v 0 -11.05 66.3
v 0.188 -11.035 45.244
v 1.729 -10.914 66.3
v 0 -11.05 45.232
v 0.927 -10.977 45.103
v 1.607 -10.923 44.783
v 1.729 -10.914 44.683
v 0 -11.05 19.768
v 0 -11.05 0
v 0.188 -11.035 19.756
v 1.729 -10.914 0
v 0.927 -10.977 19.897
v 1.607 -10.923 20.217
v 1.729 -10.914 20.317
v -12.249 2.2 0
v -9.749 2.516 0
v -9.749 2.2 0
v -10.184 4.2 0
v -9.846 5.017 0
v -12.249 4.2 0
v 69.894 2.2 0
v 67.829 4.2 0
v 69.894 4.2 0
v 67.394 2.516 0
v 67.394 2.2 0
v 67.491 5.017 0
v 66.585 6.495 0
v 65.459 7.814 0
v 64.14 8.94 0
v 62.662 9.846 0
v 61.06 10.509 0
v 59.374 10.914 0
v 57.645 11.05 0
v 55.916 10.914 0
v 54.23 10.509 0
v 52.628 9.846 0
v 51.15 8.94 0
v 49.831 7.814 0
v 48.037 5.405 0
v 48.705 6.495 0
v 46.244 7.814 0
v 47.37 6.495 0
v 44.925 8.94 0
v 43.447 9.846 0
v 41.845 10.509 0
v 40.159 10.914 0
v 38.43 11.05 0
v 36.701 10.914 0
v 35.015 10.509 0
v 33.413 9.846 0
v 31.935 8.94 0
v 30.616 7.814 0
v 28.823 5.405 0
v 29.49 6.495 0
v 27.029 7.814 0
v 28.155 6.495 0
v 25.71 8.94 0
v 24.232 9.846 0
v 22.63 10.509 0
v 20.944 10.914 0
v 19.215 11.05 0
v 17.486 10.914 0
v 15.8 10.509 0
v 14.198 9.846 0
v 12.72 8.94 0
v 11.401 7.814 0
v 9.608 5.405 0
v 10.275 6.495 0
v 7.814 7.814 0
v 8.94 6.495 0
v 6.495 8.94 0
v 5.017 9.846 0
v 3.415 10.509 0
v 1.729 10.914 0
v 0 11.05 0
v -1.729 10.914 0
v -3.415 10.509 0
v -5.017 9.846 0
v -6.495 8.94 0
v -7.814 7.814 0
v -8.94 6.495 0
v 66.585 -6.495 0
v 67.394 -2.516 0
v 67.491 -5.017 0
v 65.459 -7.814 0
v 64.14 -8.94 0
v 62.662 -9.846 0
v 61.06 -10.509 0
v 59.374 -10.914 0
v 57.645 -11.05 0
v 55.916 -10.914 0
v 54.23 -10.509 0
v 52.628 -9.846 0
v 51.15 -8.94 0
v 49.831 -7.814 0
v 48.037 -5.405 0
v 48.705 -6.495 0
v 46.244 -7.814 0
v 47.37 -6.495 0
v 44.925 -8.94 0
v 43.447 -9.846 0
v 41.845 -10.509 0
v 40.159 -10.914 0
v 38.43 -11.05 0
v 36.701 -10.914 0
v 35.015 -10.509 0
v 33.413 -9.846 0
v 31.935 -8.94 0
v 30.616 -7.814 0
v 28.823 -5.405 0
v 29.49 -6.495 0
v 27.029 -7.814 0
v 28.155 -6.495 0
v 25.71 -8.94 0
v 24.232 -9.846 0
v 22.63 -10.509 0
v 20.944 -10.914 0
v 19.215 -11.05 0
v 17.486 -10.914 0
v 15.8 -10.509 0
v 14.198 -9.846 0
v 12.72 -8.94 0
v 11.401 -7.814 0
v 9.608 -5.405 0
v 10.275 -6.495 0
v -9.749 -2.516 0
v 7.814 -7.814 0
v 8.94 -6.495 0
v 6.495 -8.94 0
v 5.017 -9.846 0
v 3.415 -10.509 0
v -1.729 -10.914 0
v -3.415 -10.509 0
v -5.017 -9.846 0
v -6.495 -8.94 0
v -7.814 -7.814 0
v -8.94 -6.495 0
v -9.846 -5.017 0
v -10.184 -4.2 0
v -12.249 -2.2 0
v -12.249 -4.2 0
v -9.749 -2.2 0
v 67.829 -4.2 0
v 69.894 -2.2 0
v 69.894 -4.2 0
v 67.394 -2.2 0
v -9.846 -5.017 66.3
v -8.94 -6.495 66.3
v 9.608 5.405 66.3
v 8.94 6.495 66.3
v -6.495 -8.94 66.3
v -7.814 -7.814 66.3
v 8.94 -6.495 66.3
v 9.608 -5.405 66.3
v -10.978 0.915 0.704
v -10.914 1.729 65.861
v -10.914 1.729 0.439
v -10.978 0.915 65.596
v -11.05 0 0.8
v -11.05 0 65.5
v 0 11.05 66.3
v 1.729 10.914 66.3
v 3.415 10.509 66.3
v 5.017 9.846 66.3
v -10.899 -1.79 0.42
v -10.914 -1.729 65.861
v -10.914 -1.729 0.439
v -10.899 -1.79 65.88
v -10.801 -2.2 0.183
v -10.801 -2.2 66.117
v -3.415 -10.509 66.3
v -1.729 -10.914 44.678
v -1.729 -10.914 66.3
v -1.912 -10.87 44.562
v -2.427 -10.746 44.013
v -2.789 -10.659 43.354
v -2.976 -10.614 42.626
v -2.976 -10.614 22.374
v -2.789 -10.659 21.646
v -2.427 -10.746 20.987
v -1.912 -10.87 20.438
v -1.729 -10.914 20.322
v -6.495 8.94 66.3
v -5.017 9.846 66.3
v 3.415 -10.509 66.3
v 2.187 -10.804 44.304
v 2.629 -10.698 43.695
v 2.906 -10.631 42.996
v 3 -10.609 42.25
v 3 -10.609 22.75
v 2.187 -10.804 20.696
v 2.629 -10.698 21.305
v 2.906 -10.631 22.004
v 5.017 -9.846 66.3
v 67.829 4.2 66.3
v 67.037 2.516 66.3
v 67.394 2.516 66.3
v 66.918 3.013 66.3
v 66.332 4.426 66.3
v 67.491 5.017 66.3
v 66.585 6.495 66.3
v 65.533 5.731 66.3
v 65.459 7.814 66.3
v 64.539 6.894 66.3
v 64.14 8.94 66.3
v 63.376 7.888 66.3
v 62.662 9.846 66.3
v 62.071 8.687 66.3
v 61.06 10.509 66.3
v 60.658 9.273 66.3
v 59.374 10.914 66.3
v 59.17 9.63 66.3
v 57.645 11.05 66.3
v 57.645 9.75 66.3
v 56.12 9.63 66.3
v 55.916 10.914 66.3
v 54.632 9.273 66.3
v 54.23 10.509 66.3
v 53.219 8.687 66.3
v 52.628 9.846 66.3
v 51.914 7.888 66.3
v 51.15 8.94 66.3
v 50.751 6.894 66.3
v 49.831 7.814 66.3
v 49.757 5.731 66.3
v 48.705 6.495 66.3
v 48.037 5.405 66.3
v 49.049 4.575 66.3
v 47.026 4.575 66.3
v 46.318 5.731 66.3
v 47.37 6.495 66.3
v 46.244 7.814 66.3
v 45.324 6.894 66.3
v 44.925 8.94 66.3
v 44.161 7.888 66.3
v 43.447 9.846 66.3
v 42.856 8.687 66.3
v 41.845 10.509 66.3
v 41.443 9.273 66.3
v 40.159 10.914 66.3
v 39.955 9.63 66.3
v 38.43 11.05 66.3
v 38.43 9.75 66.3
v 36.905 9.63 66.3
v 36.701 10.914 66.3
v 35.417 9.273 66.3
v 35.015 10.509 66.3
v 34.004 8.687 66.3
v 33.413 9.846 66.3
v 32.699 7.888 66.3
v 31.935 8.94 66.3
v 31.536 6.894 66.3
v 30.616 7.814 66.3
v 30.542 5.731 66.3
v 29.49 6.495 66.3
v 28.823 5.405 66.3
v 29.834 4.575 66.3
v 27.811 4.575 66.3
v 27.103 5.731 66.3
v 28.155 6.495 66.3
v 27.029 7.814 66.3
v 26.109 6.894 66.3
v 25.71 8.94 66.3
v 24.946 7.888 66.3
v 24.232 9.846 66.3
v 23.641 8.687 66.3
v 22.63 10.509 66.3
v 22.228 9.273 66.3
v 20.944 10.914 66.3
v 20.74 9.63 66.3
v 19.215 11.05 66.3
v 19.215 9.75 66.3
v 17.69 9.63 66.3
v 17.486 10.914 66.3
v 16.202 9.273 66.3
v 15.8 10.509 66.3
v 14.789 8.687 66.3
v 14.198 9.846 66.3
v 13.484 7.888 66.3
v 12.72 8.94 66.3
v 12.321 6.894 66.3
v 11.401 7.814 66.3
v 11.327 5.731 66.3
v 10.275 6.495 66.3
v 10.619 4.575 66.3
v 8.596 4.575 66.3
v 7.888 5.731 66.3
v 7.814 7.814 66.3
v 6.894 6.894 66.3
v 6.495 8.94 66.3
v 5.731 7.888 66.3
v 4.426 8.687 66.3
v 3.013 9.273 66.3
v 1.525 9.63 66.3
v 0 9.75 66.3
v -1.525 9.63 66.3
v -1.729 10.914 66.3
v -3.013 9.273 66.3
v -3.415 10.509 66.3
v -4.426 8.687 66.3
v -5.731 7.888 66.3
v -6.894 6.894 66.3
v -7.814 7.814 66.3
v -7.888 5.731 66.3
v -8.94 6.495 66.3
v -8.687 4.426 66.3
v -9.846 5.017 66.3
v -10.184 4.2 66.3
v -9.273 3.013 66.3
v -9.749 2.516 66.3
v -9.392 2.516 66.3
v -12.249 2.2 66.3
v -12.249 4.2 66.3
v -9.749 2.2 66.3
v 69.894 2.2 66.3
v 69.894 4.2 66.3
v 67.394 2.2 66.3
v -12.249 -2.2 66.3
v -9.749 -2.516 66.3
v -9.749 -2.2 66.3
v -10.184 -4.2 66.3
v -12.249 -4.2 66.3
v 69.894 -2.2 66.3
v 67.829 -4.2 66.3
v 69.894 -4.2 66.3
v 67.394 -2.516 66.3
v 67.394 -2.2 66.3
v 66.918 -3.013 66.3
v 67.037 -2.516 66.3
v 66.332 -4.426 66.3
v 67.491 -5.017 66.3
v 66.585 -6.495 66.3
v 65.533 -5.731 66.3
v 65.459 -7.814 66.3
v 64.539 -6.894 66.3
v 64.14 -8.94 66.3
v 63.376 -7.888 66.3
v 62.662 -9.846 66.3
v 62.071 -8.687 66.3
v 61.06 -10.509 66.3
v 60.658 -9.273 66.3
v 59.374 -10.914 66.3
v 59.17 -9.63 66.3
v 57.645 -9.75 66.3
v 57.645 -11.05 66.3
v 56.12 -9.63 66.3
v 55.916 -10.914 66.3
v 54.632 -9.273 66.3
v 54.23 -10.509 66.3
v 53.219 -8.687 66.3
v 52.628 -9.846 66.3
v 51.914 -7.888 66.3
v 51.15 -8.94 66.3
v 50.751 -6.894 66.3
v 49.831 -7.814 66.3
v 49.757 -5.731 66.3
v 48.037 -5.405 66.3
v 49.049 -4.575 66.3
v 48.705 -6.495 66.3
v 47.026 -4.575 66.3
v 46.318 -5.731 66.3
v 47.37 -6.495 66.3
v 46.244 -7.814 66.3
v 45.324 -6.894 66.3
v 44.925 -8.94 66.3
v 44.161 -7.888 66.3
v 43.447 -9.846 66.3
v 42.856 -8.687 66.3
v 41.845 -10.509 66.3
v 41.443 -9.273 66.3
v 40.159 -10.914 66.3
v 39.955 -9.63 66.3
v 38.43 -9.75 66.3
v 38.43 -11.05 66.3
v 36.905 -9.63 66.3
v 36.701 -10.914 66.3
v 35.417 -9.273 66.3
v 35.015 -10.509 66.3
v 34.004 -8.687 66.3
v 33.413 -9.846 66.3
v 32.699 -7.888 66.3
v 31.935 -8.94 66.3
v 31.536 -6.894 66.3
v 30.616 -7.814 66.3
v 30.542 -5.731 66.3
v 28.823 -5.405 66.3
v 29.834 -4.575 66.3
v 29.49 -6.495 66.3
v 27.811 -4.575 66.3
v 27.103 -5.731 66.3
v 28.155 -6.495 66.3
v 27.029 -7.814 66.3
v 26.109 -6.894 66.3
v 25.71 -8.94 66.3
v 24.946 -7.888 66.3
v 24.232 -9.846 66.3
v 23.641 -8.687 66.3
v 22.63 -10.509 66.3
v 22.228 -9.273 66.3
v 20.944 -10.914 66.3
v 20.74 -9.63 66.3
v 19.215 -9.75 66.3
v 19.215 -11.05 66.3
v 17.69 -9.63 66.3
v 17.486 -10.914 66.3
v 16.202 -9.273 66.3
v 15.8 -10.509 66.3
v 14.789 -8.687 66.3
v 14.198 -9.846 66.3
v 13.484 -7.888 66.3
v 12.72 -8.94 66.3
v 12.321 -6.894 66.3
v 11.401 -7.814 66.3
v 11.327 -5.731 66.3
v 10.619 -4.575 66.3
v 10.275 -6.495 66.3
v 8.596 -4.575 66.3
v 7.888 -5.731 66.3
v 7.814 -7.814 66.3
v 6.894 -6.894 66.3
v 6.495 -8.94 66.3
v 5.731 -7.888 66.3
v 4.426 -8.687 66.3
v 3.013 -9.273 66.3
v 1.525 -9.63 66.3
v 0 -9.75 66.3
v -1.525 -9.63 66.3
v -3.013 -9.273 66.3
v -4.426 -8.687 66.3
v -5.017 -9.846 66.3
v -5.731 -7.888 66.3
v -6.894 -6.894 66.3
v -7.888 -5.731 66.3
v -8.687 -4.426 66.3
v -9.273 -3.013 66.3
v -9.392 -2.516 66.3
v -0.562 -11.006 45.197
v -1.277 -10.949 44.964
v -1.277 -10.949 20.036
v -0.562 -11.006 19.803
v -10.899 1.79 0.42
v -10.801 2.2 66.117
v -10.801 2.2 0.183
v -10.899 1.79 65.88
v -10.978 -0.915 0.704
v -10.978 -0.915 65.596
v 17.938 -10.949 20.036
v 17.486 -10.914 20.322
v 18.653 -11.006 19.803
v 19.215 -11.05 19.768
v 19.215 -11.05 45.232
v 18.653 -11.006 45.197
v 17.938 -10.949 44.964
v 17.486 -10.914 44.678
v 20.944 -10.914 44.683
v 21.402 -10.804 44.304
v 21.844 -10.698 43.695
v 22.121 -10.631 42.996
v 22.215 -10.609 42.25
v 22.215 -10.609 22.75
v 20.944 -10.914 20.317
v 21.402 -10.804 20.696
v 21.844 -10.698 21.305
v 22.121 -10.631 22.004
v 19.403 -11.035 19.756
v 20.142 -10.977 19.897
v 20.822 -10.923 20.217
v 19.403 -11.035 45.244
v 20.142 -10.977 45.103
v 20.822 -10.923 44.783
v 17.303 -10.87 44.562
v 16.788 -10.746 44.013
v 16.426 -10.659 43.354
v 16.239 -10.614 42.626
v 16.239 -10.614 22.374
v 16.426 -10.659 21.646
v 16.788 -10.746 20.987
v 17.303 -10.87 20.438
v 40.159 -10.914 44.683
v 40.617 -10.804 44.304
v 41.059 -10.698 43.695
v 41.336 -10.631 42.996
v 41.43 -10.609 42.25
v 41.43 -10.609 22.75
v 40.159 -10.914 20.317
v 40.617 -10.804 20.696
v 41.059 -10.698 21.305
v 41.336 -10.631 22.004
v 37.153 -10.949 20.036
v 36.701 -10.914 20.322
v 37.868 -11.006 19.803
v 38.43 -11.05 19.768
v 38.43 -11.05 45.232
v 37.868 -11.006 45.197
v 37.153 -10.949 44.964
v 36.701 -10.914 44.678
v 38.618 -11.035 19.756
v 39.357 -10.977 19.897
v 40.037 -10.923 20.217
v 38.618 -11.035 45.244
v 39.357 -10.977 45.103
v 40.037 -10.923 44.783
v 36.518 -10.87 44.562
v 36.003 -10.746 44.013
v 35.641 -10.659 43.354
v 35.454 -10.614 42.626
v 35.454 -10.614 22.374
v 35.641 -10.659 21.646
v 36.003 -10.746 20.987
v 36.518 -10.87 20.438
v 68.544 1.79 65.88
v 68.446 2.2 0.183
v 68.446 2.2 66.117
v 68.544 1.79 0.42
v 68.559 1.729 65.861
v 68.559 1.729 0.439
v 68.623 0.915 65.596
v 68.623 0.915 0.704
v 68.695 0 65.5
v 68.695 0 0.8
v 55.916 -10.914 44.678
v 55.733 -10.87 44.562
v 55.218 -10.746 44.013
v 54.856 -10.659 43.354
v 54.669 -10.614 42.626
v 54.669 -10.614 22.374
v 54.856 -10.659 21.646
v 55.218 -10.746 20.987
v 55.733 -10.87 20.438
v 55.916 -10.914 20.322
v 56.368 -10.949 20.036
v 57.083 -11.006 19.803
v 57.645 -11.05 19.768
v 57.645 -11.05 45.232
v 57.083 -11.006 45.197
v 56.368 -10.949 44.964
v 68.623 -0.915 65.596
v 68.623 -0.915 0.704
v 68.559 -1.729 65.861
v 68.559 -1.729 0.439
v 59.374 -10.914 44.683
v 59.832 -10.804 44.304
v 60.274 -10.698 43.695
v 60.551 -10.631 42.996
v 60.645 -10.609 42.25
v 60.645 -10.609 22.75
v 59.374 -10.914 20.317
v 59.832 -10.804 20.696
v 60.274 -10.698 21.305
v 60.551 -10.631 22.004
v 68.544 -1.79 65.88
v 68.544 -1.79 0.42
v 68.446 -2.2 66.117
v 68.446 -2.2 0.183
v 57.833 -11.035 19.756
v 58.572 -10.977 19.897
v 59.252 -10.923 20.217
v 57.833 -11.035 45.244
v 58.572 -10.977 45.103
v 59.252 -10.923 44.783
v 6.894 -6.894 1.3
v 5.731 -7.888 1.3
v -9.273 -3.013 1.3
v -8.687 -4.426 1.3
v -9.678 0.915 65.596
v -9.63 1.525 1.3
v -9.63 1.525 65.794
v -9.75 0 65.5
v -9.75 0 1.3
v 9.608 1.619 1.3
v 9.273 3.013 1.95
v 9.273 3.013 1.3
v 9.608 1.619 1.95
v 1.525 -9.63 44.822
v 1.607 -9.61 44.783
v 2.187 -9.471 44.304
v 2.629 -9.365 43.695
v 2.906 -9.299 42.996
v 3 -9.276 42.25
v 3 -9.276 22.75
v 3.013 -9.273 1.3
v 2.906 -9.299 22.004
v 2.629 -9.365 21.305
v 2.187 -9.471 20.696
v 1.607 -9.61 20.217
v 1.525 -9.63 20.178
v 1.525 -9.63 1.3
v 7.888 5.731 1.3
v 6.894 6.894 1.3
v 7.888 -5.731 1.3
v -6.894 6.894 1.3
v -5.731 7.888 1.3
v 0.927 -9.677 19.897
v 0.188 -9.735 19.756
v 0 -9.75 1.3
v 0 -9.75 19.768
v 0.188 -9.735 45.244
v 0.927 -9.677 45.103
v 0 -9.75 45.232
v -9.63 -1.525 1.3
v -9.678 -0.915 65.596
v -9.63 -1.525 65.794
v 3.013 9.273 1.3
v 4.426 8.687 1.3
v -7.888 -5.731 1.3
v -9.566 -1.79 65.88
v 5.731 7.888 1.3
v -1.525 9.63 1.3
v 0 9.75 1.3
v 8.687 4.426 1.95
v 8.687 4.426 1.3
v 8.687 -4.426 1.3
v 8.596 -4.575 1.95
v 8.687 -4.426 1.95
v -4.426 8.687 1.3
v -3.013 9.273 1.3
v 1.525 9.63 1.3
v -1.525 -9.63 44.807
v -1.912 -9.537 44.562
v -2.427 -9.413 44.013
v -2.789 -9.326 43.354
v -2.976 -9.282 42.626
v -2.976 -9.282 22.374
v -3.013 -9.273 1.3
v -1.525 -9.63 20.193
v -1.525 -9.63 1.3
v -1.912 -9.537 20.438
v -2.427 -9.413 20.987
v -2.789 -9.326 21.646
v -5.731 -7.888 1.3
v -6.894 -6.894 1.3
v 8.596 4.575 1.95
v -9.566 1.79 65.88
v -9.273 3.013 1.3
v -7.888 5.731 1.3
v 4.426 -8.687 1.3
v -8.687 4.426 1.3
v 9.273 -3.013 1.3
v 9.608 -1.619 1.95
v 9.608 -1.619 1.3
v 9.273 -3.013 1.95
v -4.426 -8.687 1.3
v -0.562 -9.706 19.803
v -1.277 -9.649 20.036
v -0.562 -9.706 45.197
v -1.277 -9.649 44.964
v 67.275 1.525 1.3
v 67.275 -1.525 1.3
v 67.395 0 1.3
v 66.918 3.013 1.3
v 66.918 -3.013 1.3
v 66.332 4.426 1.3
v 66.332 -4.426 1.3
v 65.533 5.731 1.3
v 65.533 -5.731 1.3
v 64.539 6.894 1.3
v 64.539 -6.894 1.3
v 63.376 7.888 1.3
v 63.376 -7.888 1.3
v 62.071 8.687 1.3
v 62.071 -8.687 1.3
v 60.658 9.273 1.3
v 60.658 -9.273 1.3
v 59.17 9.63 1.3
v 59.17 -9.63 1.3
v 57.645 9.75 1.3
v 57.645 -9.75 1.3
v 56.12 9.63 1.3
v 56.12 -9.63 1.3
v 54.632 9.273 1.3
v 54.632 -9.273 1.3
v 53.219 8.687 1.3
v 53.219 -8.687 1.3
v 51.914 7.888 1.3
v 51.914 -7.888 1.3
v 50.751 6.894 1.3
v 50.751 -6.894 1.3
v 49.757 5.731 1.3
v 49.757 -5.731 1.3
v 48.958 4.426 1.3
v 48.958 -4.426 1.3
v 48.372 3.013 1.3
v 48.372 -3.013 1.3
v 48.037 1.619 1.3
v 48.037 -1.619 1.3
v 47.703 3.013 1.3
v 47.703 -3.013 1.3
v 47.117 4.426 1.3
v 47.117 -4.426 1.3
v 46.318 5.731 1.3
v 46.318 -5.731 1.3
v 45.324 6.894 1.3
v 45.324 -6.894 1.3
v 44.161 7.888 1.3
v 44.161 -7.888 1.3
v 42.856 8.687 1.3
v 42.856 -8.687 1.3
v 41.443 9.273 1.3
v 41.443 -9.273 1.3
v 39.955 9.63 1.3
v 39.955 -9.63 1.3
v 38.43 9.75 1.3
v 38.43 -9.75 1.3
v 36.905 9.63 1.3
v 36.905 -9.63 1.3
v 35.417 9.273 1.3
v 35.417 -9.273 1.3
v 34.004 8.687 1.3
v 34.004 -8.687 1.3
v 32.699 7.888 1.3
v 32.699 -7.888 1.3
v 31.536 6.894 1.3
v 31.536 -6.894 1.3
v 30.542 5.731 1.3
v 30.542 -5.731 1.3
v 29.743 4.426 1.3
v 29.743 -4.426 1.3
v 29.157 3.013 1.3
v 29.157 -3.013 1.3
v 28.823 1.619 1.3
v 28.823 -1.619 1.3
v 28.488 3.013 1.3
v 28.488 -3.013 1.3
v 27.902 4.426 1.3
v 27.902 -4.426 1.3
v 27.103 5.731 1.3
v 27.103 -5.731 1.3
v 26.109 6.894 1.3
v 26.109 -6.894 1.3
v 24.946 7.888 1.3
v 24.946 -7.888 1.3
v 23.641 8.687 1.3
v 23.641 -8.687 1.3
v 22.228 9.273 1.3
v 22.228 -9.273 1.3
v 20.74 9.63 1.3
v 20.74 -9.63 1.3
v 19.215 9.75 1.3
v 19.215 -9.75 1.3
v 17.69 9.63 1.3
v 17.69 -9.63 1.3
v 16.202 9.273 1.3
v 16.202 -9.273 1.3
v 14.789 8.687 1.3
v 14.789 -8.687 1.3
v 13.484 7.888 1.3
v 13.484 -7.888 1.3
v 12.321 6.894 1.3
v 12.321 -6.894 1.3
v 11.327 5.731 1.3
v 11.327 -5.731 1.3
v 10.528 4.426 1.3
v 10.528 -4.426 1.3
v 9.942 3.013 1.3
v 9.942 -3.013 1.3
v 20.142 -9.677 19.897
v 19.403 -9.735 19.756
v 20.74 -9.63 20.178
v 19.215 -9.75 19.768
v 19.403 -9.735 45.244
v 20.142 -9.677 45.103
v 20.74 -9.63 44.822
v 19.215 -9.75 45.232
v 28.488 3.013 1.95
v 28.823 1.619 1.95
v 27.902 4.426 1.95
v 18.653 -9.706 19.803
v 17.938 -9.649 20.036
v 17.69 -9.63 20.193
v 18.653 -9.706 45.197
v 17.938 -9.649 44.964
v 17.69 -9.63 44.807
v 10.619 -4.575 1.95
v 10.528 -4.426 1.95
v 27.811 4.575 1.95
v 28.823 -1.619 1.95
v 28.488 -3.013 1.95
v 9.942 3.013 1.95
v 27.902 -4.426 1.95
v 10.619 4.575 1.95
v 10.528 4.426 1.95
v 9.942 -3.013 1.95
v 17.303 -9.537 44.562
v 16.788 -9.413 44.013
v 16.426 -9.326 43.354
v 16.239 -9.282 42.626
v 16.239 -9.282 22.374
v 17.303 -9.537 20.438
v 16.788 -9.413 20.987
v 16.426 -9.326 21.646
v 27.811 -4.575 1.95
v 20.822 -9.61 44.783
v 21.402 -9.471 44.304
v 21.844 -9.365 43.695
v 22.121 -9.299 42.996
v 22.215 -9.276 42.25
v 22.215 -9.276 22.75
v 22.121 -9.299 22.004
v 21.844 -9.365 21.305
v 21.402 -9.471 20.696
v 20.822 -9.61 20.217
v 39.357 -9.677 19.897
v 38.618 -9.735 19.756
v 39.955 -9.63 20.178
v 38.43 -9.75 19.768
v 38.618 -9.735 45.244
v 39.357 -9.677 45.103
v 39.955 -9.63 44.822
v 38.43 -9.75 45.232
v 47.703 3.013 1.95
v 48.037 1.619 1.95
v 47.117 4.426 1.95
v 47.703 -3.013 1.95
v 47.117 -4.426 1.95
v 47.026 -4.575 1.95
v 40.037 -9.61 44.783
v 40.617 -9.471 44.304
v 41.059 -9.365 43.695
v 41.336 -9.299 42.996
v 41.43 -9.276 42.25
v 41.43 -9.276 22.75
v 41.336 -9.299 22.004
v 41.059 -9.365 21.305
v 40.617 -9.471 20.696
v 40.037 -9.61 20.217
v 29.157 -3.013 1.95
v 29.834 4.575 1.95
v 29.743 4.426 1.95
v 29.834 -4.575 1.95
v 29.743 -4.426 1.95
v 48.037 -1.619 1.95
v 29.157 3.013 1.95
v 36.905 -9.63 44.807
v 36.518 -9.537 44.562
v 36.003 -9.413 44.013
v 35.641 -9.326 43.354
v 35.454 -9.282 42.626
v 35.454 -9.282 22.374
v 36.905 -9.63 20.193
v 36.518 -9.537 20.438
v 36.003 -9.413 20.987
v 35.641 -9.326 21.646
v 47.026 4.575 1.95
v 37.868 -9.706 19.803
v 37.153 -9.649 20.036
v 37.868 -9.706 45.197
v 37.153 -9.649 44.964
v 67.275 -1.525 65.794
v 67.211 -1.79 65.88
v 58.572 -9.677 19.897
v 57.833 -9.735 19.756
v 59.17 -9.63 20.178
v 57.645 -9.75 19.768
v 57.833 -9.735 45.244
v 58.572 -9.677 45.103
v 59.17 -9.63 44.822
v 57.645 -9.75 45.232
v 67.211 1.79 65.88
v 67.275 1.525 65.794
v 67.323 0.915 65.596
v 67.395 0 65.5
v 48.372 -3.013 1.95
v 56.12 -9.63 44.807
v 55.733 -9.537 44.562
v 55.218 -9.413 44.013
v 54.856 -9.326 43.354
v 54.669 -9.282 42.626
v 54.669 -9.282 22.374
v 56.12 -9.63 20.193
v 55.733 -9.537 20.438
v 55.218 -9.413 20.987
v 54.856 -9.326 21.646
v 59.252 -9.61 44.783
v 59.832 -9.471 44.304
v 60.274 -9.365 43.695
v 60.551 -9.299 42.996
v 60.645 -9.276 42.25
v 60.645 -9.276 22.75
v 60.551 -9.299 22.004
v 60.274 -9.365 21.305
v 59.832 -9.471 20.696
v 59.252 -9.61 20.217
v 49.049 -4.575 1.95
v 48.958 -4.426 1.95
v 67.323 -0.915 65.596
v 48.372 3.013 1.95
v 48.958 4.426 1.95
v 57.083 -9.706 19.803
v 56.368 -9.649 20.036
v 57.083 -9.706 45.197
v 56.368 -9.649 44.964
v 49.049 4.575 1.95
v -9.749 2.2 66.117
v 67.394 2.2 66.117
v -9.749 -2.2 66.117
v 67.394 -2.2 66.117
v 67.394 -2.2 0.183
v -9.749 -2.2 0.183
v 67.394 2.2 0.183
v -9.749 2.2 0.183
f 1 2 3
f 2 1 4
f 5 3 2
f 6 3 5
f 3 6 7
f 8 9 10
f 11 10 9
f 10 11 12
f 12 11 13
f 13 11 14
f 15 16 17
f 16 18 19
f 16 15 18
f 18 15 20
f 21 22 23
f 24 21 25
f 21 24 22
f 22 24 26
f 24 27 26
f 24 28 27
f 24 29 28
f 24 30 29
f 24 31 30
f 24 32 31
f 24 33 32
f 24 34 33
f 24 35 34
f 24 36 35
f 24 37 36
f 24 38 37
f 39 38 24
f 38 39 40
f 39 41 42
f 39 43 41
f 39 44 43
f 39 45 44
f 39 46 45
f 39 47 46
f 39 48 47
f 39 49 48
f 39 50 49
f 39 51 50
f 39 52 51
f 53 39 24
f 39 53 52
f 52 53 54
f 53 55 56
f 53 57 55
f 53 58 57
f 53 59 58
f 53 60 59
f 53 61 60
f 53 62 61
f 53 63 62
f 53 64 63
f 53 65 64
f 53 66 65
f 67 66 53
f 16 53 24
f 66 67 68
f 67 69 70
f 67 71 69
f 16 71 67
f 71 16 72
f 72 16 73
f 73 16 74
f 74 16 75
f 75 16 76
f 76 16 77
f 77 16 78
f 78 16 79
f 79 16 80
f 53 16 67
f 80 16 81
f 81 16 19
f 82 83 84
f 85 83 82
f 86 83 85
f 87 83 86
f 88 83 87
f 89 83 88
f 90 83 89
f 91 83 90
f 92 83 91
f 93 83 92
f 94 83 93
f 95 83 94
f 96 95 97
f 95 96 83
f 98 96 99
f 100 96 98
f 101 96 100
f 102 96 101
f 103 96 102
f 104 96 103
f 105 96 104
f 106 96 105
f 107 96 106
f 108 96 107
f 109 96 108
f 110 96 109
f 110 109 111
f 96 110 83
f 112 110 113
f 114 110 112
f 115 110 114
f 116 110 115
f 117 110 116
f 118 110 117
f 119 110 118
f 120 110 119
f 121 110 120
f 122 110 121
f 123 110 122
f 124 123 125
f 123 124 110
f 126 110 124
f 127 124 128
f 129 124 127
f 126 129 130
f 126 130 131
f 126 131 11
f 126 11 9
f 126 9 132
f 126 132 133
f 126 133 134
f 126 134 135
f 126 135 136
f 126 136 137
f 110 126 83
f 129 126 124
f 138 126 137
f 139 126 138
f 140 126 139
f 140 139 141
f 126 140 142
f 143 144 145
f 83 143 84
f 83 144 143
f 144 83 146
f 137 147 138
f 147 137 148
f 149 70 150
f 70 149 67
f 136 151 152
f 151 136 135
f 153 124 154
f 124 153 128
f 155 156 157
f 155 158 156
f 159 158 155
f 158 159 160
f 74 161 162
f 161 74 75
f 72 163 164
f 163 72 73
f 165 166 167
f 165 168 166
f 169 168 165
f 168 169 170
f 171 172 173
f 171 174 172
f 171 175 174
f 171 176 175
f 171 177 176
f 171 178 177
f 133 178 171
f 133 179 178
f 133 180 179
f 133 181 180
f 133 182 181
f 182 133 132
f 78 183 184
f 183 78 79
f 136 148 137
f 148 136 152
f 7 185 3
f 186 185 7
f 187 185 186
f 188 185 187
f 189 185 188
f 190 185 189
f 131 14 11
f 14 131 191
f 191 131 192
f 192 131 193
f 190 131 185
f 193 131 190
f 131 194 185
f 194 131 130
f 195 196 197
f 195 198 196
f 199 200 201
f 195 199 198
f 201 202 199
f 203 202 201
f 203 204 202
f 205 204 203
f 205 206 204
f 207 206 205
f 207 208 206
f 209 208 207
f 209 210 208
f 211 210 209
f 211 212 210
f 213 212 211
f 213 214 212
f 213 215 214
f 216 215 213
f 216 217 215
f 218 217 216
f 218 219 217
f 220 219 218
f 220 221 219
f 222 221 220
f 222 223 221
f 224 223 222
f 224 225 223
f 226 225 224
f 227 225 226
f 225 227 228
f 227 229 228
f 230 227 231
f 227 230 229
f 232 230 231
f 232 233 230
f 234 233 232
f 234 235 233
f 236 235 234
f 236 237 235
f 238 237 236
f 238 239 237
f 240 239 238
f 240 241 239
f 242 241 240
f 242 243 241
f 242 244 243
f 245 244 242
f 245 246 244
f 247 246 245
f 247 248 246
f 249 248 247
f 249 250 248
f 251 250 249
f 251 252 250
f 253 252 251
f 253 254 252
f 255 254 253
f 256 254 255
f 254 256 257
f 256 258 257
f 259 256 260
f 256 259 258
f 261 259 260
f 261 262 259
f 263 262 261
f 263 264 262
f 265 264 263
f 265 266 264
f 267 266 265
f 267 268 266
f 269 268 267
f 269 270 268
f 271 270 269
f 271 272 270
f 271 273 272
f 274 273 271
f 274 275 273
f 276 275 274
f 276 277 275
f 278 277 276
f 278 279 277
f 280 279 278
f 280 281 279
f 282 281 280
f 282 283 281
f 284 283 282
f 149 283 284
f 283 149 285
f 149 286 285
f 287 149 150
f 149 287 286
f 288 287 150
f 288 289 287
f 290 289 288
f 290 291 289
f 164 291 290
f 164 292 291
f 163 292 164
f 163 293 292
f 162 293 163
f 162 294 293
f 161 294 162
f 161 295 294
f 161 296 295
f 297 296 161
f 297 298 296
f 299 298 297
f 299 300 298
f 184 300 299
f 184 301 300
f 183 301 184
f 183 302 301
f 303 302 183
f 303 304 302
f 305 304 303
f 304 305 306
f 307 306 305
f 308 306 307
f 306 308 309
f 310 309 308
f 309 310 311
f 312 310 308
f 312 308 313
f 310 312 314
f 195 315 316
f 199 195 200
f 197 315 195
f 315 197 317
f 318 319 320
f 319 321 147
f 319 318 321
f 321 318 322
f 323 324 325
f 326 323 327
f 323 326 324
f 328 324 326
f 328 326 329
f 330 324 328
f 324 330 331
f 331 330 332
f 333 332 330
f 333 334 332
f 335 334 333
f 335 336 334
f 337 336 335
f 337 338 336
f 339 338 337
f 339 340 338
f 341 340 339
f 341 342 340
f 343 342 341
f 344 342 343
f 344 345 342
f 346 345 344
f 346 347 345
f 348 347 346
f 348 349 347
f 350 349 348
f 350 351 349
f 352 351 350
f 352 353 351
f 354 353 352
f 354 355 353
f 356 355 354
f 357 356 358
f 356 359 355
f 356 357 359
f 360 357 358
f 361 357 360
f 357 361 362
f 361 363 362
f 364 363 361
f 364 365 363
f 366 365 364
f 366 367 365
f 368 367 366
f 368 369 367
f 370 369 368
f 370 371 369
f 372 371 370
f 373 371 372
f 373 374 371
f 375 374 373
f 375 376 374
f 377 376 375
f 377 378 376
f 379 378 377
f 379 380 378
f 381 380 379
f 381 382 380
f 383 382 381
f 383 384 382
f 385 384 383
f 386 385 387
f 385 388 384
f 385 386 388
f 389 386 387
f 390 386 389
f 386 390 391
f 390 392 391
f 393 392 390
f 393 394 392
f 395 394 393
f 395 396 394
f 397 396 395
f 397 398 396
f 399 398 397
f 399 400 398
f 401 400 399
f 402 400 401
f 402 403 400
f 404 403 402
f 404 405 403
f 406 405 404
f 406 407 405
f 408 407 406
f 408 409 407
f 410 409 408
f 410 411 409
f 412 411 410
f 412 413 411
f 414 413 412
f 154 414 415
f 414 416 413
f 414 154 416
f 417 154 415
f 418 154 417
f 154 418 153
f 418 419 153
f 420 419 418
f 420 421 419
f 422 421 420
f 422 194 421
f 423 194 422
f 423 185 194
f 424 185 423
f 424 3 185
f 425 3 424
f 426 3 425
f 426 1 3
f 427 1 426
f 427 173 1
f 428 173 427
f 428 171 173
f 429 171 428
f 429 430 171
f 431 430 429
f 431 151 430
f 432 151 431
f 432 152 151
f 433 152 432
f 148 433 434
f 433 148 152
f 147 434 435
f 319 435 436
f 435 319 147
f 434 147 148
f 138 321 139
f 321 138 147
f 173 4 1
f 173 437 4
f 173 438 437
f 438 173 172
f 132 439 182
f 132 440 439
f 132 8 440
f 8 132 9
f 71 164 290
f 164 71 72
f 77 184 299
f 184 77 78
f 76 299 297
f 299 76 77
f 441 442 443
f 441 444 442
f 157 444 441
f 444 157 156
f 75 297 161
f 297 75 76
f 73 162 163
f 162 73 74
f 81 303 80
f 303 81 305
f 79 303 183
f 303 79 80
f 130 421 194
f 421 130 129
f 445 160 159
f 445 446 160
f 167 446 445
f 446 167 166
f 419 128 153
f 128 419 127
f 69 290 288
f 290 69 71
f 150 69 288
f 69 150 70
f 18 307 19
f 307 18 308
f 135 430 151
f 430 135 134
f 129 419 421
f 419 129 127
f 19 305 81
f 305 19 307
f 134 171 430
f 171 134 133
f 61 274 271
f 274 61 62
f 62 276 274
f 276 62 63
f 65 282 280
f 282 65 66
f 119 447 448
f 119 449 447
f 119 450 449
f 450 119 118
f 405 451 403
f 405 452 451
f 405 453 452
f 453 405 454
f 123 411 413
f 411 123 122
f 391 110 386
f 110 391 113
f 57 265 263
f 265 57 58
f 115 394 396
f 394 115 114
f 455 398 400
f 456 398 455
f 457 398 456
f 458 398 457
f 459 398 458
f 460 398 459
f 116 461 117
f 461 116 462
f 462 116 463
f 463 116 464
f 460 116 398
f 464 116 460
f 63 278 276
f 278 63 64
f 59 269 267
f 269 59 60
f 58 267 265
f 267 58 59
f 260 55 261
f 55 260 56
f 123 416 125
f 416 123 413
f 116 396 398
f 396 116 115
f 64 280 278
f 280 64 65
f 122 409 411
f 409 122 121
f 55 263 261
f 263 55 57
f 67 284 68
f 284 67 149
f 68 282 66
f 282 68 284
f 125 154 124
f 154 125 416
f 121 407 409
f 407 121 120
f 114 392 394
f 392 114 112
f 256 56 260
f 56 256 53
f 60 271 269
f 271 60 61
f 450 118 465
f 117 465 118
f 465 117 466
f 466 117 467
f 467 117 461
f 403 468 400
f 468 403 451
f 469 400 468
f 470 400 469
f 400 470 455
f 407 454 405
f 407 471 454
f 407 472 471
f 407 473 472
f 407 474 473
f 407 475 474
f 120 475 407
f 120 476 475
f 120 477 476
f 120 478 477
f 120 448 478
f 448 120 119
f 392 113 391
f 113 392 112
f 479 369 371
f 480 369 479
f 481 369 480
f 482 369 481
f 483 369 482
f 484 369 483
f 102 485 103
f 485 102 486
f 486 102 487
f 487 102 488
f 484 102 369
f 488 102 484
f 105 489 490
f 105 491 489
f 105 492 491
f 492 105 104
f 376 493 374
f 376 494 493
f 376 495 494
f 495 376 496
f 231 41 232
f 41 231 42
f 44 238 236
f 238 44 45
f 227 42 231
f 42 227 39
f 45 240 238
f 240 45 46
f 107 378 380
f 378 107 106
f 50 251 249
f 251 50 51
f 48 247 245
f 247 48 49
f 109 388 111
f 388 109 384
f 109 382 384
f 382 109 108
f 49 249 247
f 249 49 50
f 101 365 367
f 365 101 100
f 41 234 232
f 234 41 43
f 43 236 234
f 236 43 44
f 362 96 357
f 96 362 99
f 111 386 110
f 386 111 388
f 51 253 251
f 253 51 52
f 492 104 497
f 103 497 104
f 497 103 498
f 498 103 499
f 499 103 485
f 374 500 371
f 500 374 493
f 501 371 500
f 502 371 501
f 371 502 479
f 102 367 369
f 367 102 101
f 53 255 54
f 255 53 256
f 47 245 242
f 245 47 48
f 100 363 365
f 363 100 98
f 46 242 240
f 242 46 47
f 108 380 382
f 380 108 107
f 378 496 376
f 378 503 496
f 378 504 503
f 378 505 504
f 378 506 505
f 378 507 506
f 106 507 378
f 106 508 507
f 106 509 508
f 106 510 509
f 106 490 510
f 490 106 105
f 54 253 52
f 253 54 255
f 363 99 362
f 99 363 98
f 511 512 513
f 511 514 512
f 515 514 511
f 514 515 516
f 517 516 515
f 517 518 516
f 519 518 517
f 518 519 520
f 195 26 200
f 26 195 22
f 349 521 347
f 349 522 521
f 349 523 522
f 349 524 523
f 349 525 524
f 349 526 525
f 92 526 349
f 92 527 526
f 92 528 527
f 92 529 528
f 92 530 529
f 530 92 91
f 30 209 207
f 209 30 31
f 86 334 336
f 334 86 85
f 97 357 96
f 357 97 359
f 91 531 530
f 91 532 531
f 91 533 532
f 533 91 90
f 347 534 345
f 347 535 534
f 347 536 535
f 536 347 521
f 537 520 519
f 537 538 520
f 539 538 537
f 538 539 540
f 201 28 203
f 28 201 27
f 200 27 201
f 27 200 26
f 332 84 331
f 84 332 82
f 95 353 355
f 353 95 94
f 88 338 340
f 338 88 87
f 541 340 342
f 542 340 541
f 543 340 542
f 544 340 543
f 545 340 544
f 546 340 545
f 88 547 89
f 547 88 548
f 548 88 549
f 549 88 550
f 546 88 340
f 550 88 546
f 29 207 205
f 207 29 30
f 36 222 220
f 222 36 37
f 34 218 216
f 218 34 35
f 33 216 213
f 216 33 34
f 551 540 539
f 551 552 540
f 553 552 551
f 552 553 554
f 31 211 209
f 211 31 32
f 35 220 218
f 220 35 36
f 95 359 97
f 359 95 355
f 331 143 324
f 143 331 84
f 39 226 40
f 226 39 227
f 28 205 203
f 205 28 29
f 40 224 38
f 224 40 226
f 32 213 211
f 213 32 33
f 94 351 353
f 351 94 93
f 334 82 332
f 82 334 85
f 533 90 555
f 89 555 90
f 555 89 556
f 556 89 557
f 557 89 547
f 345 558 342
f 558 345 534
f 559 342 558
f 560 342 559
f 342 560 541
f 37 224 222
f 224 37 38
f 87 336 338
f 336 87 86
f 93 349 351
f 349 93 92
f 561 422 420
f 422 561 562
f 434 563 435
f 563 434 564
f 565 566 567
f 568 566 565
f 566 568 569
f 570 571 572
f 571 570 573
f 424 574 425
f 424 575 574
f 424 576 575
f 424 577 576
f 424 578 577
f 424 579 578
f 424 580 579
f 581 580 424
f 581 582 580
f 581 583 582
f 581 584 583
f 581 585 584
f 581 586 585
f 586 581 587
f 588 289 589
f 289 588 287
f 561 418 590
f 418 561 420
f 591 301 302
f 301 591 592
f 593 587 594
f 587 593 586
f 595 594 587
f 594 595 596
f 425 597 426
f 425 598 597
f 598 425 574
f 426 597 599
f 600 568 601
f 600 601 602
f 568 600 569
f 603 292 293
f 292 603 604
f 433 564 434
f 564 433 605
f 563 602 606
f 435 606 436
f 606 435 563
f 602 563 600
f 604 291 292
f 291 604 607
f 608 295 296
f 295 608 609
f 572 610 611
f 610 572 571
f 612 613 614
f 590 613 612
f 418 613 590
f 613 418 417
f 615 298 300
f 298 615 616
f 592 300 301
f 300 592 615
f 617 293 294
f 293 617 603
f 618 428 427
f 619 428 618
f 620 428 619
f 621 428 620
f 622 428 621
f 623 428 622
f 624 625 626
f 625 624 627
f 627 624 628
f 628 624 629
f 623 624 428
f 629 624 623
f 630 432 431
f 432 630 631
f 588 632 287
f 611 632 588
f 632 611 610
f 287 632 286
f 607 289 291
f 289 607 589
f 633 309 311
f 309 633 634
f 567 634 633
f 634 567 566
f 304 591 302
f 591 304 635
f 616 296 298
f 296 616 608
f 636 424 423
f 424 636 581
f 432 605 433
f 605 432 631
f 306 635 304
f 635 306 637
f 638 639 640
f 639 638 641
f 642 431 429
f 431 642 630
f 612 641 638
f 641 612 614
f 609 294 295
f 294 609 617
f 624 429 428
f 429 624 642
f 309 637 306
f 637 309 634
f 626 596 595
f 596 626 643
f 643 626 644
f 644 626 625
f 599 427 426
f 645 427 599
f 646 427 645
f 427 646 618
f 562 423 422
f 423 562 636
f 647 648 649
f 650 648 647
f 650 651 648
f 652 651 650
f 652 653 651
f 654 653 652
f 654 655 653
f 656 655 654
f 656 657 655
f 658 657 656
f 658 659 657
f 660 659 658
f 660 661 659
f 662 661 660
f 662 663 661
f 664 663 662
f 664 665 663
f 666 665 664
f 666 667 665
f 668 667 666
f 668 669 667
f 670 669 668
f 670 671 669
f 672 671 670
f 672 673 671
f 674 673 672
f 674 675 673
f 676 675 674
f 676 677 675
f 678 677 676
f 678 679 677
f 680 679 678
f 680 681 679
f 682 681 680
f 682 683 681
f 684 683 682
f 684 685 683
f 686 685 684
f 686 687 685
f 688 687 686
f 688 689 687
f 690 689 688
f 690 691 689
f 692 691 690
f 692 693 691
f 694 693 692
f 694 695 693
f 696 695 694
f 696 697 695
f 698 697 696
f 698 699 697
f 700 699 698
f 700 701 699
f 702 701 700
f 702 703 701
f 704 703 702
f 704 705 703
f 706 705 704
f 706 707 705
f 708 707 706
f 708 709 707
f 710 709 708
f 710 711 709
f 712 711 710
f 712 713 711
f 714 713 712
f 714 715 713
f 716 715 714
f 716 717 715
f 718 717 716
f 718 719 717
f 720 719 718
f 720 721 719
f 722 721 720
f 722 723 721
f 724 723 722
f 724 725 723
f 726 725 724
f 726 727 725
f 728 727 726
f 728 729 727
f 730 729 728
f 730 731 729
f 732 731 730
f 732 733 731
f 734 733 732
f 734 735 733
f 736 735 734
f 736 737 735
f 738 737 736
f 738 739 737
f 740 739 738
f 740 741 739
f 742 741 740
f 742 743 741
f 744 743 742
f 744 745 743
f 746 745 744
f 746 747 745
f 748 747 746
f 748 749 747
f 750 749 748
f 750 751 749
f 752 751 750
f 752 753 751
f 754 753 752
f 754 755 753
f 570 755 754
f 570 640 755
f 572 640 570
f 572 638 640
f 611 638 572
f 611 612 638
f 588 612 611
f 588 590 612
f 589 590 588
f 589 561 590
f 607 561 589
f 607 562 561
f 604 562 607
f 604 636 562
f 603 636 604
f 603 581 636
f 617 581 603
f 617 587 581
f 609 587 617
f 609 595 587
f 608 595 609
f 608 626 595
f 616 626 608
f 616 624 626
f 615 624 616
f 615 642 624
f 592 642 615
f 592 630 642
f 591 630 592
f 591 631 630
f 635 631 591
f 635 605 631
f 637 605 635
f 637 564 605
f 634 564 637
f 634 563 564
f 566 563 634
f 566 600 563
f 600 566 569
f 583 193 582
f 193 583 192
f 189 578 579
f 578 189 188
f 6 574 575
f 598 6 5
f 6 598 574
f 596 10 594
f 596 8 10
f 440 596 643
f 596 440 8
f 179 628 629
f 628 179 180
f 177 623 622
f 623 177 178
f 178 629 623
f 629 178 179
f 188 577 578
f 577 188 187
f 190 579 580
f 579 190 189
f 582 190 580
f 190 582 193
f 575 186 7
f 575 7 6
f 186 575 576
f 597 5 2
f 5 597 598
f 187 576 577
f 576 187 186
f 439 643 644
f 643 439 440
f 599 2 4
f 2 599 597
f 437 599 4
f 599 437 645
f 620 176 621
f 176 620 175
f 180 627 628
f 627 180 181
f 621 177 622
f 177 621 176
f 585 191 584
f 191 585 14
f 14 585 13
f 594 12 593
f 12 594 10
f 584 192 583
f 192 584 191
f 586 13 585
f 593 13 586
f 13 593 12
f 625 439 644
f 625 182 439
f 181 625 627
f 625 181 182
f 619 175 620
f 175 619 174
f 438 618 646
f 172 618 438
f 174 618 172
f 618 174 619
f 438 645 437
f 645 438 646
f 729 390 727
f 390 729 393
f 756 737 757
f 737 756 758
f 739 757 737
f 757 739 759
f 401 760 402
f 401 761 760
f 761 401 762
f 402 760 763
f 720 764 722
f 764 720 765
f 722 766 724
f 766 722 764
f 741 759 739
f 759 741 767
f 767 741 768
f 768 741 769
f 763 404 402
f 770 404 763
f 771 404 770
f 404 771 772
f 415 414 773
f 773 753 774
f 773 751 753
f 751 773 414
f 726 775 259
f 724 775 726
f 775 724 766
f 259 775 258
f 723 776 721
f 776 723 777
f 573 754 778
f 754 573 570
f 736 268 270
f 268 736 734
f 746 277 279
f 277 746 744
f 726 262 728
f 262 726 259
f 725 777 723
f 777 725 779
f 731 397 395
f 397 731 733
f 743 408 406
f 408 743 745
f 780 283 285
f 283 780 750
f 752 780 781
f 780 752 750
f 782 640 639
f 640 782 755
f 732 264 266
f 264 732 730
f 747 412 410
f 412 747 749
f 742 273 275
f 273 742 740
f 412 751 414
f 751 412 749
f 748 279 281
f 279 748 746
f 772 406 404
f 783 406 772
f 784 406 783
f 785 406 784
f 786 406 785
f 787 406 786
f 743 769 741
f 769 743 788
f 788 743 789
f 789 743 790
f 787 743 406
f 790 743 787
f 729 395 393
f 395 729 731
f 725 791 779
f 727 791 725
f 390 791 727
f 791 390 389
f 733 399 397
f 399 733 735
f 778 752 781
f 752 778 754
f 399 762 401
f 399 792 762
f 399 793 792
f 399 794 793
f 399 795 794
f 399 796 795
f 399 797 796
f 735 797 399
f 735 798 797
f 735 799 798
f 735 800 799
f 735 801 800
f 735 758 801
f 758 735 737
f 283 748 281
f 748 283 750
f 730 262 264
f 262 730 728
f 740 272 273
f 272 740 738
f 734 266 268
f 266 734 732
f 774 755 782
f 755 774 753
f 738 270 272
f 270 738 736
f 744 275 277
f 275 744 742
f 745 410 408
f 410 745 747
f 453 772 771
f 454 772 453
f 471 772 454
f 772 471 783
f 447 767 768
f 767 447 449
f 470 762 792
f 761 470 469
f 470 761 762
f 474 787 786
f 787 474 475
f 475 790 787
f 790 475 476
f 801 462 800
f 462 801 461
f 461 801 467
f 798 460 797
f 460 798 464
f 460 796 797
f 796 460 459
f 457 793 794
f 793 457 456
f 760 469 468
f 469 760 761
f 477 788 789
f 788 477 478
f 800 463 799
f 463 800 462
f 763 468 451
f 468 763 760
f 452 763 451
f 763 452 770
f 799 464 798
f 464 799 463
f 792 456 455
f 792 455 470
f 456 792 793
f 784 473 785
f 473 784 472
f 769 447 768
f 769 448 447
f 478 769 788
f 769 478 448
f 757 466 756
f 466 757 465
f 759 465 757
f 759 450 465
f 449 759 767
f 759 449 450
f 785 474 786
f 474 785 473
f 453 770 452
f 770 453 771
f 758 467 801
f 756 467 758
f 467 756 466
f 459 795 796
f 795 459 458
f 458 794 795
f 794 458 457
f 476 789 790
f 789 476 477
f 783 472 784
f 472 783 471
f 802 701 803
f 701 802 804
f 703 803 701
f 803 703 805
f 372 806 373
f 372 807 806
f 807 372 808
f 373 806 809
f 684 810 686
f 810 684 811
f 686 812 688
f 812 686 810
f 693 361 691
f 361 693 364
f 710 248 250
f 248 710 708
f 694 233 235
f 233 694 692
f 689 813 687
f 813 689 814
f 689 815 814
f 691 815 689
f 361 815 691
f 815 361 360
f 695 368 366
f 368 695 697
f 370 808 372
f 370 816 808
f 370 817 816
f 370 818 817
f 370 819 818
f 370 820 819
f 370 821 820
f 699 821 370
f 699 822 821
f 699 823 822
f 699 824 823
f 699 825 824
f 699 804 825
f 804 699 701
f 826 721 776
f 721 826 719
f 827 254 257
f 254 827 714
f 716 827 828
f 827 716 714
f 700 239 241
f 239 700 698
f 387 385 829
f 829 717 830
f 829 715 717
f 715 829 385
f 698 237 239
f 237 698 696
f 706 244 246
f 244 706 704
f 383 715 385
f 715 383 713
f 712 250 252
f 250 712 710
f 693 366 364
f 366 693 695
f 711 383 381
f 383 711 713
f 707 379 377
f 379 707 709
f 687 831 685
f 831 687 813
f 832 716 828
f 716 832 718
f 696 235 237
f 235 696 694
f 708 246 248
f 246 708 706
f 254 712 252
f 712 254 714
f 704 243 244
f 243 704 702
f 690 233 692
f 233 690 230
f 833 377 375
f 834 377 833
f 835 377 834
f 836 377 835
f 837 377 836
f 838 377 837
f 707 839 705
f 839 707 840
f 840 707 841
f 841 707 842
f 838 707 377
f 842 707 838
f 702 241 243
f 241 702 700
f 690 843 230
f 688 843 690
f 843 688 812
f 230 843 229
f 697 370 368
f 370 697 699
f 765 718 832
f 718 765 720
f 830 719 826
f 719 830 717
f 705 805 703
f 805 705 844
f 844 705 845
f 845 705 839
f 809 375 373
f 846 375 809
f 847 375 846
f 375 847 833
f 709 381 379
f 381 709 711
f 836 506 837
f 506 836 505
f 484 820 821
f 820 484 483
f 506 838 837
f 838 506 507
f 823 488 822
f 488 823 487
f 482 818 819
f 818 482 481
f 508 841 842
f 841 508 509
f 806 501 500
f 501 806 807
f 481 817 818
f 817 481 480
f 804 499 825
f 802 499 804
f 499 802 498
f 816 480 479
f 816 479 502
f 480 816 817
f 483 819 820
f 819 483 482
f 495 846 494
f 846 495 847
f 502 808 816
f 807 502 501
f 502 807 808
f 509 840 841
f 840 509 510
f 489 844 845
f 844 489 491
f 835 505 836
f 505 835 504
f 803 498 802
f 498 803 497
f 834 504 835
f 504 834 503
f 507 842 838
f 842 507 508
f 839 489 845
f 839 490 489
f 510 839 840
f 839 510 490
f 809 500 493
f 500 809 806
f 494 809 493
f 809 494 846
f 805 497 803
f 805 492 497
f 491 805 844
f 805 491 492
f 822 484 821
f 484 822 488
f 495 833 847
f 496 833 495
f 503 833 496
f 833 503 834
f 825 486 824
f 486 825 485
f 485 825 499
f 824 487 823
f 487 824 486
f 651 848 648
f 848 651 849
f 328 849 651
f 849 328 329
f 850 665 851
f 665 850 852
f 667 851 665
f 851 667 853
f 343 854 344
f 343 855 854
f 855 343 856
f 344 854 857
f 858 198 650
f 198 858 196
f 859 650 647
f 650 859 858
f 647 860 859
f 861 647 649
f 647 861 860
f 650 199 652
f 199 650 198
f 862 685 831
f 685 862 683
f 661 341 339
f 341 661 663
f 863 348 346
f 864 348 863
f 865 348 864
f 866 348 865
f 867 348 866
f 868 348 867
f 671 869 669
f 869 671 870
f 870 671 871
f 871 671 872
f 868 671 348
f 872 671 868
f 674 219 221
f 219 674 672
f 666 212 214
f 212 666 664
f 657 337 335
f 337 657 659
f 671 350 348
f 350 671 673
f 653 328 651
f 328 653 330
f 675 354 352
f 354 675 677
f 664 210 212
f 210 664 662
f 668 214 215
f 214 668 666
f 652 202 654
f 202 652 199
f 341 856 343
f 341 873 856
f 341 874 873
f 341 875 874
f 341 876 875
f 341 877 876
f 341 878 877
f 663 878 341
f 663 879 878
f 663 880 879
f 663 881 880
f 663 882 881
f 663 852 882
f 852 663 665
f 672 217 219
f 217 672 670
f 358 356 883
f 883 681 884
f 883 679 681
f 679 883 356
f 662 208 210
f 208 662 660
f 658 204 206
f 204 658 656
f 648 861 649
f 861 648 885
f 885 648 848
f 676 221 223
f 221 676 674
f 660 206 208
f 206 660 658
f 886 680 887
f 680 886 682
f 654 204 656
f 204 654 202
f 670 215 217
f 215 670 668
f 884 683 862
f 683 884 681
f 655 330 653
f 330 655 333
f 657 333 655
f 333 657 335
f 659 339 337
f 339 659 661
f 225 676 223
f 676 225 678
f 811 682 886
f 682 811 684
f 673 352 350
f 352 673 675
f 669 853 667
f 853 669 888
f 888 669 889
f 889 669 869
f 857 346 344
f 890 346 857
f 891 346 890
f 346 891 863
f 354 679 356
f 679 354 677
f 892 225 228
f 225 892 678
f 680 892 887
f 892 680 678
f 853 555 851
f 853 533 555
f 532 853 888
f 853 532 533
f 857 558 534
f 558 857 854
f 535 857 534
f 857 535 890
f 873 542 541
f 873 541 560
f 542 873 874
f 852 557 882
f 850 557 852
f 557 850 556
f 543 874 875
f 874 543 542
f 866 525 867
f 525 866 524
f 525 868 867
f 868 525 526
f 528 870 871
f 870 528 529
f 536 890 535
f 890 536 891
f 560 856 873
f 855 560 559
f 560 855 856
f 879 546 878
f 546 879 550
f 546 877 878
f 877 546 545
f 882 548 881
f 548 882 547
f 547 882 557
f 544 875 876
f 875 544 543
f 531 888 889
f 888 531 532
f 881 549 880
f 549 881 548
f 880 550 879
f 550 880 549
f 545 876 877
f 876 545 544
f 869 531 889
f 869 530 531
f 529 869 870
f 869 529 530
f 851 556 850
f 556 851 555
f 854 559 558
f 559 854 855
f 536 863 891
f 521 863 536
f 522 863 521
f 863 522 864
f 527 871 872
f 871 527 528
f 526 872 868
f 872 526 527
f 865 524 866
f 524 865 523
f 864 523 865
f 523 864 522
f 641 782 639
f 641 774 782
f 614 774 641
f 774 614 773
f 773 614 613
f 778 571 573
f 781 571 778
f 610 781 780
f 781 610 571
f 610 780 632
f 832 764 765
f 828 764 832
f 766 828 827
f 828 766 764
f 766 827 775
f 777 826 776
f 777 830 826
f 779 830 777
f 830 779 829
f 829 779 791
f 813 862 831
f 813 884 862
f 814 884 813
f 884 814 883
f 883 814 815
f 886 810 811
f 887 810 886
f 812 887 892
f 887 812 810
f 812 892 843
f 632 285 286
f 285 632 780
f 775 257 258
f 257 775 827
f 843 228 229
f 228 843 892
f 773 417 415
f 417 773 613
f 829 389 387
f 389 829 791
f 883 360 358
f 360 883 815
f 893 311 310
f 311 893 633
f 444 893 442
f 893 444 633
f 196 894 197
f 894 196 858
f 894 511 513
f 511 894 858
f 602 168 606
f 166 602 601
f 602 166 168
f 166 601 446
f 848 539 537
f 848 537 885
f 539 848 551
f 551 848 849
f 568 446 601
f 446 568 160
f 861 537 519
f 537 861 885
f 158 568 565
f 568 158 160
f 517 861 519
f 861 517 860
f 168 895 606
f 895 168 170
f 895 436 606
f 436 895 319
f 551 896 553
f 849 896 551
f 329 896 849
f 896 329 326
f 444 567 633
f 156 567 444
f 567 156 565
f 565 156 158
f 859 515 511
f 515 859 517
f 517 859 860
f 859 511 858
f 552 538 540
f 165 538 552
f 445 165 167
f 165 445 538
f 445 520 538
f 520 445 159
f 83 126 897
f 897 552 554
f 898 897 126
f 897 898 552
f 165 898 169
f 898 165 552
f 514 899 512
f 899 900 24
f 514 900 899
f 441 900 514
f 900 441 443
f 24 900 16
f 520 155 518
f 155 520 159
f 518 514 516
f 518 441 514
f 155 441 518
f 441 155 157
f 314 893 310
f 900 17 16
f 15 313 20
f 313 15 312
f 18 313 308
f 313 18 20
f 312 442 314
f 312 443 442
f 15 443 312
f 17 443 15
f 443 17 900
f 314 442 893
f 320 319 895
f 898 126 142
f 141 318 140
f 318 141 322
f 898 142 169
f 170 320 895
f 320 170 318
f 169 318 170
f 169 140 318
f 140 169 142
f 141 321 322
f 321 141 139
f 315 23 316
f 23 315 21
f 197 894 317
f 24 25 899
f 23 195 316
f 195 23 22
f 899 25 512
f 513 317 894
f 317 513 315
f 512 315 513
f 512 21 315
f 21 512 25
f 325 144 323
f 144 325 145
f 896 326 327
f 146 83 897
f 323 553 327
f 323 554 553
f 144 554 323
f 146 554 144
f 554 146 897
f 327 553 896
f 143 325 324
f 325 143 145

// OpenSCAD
//**********************************************
//*    Battery Tray for 4 x AA Cells (Mignon)
//*  Customizable with Thingiverse customizer
//*
//*     Version 2.10.2016 Henning Stöcklein
//*           free for non-commercial use
//*
//* History:
//* 20-DEC-2015: Optional cutout in the middle of each cell to read the battery label
//* 23-DEC-2015: Cell distance factor [%] for extra fat cells
//*                     Optional bottom groove for rubber band
//* 02-OCT-2016: Battery Type selector (d and h joined)
//*                     Custom Cell Type added
//*                     LiIon 18650 and LR44 button cell added
//*                     Height Correction Factor added
//*                     Select Longhole Cutout (none, one side, both sides)
//*                     All numeric parameters customizable with slider controls 
//*                     Added charging cap option (not yet in customizer)
//*
//**********************************************

// What to display?
objects = "TRAY" ; // ["TRAY": Battery tray, "CAP": Charging cap]

// Battery Type
cell_type = "Li-18650" ; // ["A": A Baby, "AA": AA Mignon, "AAA": AAA Micro, "LR44": LR44 button cell, "Li-18650": 18650 LiIon, "Custom": Custom - free]

// Battery cell diameter for "Custom" type
cell_d = 14.1 ;   // [8:0.1:30]

// Battery cell height for "Custom" type
cell_h = 50.0 ;   // [5:0.2:80]

// Radial clearance between cell and wall
gap    = 0.6 ; // [0:0.05:1.5]

// Wall and bottom thickness
wall    = 1.3 ; // [1:0.05:2.5]

// Number of battery cells
numcells = 4 ; // [1:8]

// Cell distance in % of diameter
distance = 105 ; // [95:110]

// Height Correction Factor [%]
h_cor = 100 ; // [90:110]


/* [Longhole Cutout Dimensions] */
// Create longhole view window at half height?
cutoffs = -10 ; // [0:Both sides, -10: Only one side, 100:None]

// View Window Cutout Radius
r_window = 3 ; // [0:0.1:5]

// View Window Cutout Height in %
h_window = 30 ; // [10:60]


/* [Rubber band guide Dimensions] */
// Create guide for rubber band ?
rubberguide = 1 ;  // [0: No, 1: Yes]

// Rubber guide width
guide_w  = 2 ; // [1:0.1:3.5]

// Rubber band width
rubber_w = 4.4  ; // [2:0.1:6]

// Create top groove for rubber band on top ?
rubber_topgroove = 1 ;  // [0: No, 1: Yes]

// Create bottom groove for rubber band on top ?
rubber_botgroove = 1 ;  // [0: No, 1: Yes]

// Groove depth
groove_h = 0.8 ; // [0.0:0.1:2.0]


/* [Charge Cap Dimensions] */
// Cap height
capht = 5 ;  // [3:0.2:15]

// Cap wall and bottom thickness
capwall    = 2.8 ; // [1:0.05:4]

// Cap charge bolt hole diameter
capbolt_d  = 3.5 ; // [2:0.1:4]


//********* end of customizable params ***************

// Select d and h according to selected cell type. Leave "custom" dimensions unchanged...
if (objects == "TRAY") {
  if (cell_type == "A")         tray (25.0, h_cor/100 * 50.0) ;
  if (cell_type == "AA")       tray (14.1, h_cor/100 * 50.0) ;
  if (cell_type == "AAA")      tray (10.4, h_cor/100 * 44.6) ;
  if (cell_type == "LR44")      tray (11.7, h_cor/100 * 5.4) ;
  if (cell_type == "Li-18650") tray (18.3, h_cor/100 * 65.0) ;
  if (cell_type == "Custom")  tray (cell_d, h_cor/100 * cell_h) ;
}

if (objects == "CAP") translate ([0,0,-5]) 
{
  if (cell_type == "A")         chargecap (25.0, capht) ;
  if (cell_type == "AA")       chargecap (14.1, capht) ;
  if (cell_type == "AAA")      chargecap (10.4, capht) ;
  if (cell_type == "LR44")      chargecap (11.7, capht) ;
  if (cell_type == "Li-18650") chargecap (18.3, capht) ;
  if (cell_type == "Custom")  chargecap (cell_d, capht) ;
}


//* Module definition
module tray (cdia, cht)
{
    difference()
    {
        for (i = [0:numcells-1])
            translate ([i*cdia*distance/100,0,0]) 
                cylinder (r=cdia/2 + gap+wall, h=cht+wall, $fn=40) ;
        for (i = [0:numcells-1])
        {
            translate ([i*cdia*distance/100,0,wall]) cylinder (r=cdia/2 + gap, h=cht+wall, $fn=40) ;

            //* Cutout optional longhole window
            if (h_window != 0) hull()
            {
                translate ([i*cdia*distance/100, cutoffs, cht/2+h_window/200*cht]) 
                    rotate ([90,0,0]) cylinder (r=r_window, h=2*cdia, center=true, $fn=25) ;
                translate ([i*cdia*distance/100, cutoffs, cht/2-h_window/200*cht]) 
                    rotate ([90,0,0]) cylinder (r=r_window, h=2*cdia, center=true, $fn=25) ;
            }
            translate ([i*cdia*distance/100,0,wall]) cylinder (r=cdia/2 + gap, h=cht+wall, $fn=40) ;
        }
        translate ([(numcells-1)/2*cdia*distance/100, 0, cht/2+2*wall]) cube ([(numcells-1)*cdia, cdia/2, cht+wall], center=true) ;
        
        if (rubber_topgroove == 1)
          translate ([-cdia-wall, 0, cht+wall+rubber_w-groove_h]) 
             rotate ([0,90,0]) cylinder (r=rubber_w, h=(numcells+1)*cdia, $fn=30) ;

       if (rubber_botgroove == 1)
          translate ([-cdia-wall, 0, -rubber_w+groove_h]) 
             rotate ([0,90,0]) cylinder (r=rubber_w, h=(numcells+1)*cdia, $fn=30) ;
    }   

    if (rubberguide == 1)
    {
        translate ([-cdia*0.53-wall, guide_w/2+rubber_w/2, cht/2+wall/2]) cube ([2.5, guide_w, cht+wall], center=true) ;
        translate ([-cdia*0.53-wall, -guide_w/2-rubber_w/2, cht/2+wall/2]) cube ([2.5, guide_w, cht+wall], center=true) ;
        translate ([(numcells-1)*cdia*distance/100+cdia*0.53+wall, guide_w/2+rubber_w/2, cht/2+wall/2]) cube ([2.5, guide_w, cht+wall], center=true) ;
        translate ([(numcells-1)*cdia*distance/100+cdia*0.53+wall, -guide_w/2-rubber_w/2, cht/2+wall/2]) cube ([2.5, guide_w, cht+wall], center=true) ;
    }
} // module


module chargecap (cdia, cht)
{
    difference()
    {
       union() {
          translate ([0,0,1]) cylinder (r=cdia/2 + gap/2 +2*capwall, h=capht+capwall-1, $fn=40) ;
          translate ([0,0,0]) 
              cylinder (r2=cdia/2+gap/2+2*capwall, r1=cdia/2+gap/2+2*capwall-1, h=1, $fn=40) ;
       }
       translate ([0,0,capwall]) cylinder (r=cdia/2 + gap/2 +capwall, h=capht+0.1, $fn=40) ;

       // M3 thread hole for charge contact
       translate ([0,0,-1]) cylinder (r=capbolt_d/2, 40, $fn=30) ;

       // Slot opening cut
       translate ([0,0,capht/2+capwall]) cube ([50, cdia+wall, capht+0.1], center=true) ;
       translate ([cdia/2+wall+10/2,0,capht/2+capwall]) cube ([10, 50, capht+0.1], center=true) ;
       translate ([-cdia/2-wall-10/2,0,capht/2+capwall]) cube ([10, 50, capht+0.1], center=true) ;
    }
} // module


module battery()
{
    translate ([0,0,wall]) cylinder (r=cdia/2, h=cht, $fn=30) ;
}

// %battery() ;
